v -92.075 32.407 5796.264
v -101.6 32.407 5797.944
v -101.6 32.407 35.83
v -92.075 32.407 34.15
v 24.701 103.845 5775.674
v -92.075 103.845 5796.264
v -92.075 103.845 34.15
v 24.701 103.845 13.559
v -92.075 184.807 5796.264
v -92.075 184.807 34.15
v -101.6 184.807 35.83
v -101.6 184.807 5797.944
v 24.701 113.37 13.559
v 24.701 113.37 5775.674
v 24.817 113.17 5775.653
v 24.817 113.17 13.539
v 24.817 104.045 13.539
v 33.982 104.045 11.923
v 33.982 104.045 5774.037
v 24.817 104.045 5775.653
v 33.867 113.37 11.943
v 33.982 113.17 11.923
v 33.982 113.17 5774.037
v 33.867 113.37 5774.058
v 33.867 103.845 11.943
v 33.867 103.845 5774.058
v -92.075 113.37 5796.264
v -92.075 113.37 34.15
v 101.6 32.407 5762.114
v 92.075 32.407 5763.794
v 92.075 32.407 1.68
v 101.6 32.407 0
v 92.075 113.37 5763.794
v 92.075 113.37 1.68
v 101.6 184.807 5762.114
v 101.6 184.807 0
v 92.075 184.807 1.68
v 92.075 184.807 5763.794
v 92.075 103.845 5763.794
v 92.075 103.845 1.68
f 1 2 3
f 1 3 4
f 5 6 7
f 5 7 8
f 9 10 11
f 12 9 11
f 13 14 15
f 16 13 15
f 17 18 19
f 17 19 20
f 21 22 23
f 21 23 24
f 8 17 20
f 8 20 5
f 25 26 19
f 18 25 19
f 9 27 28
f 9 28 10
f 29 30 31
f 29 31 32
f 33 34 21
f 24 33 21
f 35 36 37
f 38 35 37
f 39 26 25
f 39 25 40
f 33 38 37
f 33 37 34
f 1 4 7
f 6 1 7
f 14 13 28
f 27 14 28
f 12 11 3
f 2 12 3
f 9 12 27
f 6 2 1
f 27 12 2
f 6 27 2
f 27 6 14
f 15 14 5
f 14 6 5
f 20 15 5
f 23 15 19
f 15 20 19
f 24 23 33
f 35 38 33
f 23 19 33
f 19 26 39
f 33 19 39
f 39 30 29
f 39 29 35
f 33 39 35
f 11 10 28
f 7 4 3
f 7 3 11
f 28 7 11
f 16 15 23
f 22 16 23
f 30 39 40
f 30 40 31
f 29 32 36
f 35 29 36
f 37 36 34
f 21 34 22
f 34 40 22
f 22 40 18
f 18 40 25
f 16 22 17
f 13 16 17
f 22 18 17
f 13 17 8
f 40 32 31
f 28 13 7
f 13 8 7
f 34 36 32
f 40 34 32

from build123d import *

# Parameters (mm, degrees)
F1_DEPTH = 5797.944
F4_DEPTH = 5797.945
F5_DEPTH = 152.401


with BuildPart() as f1:
    # F0 (on Top) → F1 (new body)
    with BuildSketch(Plane.XY):
        Polygon((-92.075, 184.807411), (-101.6, 184.807411), (-101.6, 32.407411), (-92.075, 32.407411), (-92.075, 103.844911), (92.075, 103.844911), (92.075, 32.407411), (101.6, 32.407411), (101.6, 184.807411), (92.075, 184.807411), (92.075, 113.369911), (-92.075, 113.369911), align=None)
    extrude(amount=F1_DEPTH)

    # F3 (on face) → F4 (cut, through all)
    with BuildSketch(Plane.XY.offset(5797.944)):
        Polygon((33.866667, 113.369911), (24.701231, 113.369911), (24.816702, 113.169911), (33.982137, 113.169911), align=None)
        Polygon((24.816702, 104.044911), (24.701231, 103.844911), (33.866667, 103.844911), (33.982137, 104.044911), align=None)
    extrude(amount=-F4_DEPTH, mode=Mode.SUBTRACT)

    # F2 (on face) → F5 (cut, through all)
    with BuildSketch(Plane.XZ.offset(-32.407411)):
        Polygon((-92.075, 5797.944), (-92.075, 5796.264486), (101.6, 5762.114358), (101.6, 5797.944), align=None)
        Polygon((-92.075, 5797.944), (-101.6, 5797.944), (-92.075, 5796.264486), align=None)
        Polygon((-92.075, 34.150128), (-92.075, 0), (101.6, 0), align=None)
        Polygon((-101.6, 35.829642), (-101.6, 0), (-92.075, 0), (-92.075, 34.150128), align=None)
    extrude(amount=-F5_DEPTH, mode=Mode.SUBTRACT)


solid = f1.part
